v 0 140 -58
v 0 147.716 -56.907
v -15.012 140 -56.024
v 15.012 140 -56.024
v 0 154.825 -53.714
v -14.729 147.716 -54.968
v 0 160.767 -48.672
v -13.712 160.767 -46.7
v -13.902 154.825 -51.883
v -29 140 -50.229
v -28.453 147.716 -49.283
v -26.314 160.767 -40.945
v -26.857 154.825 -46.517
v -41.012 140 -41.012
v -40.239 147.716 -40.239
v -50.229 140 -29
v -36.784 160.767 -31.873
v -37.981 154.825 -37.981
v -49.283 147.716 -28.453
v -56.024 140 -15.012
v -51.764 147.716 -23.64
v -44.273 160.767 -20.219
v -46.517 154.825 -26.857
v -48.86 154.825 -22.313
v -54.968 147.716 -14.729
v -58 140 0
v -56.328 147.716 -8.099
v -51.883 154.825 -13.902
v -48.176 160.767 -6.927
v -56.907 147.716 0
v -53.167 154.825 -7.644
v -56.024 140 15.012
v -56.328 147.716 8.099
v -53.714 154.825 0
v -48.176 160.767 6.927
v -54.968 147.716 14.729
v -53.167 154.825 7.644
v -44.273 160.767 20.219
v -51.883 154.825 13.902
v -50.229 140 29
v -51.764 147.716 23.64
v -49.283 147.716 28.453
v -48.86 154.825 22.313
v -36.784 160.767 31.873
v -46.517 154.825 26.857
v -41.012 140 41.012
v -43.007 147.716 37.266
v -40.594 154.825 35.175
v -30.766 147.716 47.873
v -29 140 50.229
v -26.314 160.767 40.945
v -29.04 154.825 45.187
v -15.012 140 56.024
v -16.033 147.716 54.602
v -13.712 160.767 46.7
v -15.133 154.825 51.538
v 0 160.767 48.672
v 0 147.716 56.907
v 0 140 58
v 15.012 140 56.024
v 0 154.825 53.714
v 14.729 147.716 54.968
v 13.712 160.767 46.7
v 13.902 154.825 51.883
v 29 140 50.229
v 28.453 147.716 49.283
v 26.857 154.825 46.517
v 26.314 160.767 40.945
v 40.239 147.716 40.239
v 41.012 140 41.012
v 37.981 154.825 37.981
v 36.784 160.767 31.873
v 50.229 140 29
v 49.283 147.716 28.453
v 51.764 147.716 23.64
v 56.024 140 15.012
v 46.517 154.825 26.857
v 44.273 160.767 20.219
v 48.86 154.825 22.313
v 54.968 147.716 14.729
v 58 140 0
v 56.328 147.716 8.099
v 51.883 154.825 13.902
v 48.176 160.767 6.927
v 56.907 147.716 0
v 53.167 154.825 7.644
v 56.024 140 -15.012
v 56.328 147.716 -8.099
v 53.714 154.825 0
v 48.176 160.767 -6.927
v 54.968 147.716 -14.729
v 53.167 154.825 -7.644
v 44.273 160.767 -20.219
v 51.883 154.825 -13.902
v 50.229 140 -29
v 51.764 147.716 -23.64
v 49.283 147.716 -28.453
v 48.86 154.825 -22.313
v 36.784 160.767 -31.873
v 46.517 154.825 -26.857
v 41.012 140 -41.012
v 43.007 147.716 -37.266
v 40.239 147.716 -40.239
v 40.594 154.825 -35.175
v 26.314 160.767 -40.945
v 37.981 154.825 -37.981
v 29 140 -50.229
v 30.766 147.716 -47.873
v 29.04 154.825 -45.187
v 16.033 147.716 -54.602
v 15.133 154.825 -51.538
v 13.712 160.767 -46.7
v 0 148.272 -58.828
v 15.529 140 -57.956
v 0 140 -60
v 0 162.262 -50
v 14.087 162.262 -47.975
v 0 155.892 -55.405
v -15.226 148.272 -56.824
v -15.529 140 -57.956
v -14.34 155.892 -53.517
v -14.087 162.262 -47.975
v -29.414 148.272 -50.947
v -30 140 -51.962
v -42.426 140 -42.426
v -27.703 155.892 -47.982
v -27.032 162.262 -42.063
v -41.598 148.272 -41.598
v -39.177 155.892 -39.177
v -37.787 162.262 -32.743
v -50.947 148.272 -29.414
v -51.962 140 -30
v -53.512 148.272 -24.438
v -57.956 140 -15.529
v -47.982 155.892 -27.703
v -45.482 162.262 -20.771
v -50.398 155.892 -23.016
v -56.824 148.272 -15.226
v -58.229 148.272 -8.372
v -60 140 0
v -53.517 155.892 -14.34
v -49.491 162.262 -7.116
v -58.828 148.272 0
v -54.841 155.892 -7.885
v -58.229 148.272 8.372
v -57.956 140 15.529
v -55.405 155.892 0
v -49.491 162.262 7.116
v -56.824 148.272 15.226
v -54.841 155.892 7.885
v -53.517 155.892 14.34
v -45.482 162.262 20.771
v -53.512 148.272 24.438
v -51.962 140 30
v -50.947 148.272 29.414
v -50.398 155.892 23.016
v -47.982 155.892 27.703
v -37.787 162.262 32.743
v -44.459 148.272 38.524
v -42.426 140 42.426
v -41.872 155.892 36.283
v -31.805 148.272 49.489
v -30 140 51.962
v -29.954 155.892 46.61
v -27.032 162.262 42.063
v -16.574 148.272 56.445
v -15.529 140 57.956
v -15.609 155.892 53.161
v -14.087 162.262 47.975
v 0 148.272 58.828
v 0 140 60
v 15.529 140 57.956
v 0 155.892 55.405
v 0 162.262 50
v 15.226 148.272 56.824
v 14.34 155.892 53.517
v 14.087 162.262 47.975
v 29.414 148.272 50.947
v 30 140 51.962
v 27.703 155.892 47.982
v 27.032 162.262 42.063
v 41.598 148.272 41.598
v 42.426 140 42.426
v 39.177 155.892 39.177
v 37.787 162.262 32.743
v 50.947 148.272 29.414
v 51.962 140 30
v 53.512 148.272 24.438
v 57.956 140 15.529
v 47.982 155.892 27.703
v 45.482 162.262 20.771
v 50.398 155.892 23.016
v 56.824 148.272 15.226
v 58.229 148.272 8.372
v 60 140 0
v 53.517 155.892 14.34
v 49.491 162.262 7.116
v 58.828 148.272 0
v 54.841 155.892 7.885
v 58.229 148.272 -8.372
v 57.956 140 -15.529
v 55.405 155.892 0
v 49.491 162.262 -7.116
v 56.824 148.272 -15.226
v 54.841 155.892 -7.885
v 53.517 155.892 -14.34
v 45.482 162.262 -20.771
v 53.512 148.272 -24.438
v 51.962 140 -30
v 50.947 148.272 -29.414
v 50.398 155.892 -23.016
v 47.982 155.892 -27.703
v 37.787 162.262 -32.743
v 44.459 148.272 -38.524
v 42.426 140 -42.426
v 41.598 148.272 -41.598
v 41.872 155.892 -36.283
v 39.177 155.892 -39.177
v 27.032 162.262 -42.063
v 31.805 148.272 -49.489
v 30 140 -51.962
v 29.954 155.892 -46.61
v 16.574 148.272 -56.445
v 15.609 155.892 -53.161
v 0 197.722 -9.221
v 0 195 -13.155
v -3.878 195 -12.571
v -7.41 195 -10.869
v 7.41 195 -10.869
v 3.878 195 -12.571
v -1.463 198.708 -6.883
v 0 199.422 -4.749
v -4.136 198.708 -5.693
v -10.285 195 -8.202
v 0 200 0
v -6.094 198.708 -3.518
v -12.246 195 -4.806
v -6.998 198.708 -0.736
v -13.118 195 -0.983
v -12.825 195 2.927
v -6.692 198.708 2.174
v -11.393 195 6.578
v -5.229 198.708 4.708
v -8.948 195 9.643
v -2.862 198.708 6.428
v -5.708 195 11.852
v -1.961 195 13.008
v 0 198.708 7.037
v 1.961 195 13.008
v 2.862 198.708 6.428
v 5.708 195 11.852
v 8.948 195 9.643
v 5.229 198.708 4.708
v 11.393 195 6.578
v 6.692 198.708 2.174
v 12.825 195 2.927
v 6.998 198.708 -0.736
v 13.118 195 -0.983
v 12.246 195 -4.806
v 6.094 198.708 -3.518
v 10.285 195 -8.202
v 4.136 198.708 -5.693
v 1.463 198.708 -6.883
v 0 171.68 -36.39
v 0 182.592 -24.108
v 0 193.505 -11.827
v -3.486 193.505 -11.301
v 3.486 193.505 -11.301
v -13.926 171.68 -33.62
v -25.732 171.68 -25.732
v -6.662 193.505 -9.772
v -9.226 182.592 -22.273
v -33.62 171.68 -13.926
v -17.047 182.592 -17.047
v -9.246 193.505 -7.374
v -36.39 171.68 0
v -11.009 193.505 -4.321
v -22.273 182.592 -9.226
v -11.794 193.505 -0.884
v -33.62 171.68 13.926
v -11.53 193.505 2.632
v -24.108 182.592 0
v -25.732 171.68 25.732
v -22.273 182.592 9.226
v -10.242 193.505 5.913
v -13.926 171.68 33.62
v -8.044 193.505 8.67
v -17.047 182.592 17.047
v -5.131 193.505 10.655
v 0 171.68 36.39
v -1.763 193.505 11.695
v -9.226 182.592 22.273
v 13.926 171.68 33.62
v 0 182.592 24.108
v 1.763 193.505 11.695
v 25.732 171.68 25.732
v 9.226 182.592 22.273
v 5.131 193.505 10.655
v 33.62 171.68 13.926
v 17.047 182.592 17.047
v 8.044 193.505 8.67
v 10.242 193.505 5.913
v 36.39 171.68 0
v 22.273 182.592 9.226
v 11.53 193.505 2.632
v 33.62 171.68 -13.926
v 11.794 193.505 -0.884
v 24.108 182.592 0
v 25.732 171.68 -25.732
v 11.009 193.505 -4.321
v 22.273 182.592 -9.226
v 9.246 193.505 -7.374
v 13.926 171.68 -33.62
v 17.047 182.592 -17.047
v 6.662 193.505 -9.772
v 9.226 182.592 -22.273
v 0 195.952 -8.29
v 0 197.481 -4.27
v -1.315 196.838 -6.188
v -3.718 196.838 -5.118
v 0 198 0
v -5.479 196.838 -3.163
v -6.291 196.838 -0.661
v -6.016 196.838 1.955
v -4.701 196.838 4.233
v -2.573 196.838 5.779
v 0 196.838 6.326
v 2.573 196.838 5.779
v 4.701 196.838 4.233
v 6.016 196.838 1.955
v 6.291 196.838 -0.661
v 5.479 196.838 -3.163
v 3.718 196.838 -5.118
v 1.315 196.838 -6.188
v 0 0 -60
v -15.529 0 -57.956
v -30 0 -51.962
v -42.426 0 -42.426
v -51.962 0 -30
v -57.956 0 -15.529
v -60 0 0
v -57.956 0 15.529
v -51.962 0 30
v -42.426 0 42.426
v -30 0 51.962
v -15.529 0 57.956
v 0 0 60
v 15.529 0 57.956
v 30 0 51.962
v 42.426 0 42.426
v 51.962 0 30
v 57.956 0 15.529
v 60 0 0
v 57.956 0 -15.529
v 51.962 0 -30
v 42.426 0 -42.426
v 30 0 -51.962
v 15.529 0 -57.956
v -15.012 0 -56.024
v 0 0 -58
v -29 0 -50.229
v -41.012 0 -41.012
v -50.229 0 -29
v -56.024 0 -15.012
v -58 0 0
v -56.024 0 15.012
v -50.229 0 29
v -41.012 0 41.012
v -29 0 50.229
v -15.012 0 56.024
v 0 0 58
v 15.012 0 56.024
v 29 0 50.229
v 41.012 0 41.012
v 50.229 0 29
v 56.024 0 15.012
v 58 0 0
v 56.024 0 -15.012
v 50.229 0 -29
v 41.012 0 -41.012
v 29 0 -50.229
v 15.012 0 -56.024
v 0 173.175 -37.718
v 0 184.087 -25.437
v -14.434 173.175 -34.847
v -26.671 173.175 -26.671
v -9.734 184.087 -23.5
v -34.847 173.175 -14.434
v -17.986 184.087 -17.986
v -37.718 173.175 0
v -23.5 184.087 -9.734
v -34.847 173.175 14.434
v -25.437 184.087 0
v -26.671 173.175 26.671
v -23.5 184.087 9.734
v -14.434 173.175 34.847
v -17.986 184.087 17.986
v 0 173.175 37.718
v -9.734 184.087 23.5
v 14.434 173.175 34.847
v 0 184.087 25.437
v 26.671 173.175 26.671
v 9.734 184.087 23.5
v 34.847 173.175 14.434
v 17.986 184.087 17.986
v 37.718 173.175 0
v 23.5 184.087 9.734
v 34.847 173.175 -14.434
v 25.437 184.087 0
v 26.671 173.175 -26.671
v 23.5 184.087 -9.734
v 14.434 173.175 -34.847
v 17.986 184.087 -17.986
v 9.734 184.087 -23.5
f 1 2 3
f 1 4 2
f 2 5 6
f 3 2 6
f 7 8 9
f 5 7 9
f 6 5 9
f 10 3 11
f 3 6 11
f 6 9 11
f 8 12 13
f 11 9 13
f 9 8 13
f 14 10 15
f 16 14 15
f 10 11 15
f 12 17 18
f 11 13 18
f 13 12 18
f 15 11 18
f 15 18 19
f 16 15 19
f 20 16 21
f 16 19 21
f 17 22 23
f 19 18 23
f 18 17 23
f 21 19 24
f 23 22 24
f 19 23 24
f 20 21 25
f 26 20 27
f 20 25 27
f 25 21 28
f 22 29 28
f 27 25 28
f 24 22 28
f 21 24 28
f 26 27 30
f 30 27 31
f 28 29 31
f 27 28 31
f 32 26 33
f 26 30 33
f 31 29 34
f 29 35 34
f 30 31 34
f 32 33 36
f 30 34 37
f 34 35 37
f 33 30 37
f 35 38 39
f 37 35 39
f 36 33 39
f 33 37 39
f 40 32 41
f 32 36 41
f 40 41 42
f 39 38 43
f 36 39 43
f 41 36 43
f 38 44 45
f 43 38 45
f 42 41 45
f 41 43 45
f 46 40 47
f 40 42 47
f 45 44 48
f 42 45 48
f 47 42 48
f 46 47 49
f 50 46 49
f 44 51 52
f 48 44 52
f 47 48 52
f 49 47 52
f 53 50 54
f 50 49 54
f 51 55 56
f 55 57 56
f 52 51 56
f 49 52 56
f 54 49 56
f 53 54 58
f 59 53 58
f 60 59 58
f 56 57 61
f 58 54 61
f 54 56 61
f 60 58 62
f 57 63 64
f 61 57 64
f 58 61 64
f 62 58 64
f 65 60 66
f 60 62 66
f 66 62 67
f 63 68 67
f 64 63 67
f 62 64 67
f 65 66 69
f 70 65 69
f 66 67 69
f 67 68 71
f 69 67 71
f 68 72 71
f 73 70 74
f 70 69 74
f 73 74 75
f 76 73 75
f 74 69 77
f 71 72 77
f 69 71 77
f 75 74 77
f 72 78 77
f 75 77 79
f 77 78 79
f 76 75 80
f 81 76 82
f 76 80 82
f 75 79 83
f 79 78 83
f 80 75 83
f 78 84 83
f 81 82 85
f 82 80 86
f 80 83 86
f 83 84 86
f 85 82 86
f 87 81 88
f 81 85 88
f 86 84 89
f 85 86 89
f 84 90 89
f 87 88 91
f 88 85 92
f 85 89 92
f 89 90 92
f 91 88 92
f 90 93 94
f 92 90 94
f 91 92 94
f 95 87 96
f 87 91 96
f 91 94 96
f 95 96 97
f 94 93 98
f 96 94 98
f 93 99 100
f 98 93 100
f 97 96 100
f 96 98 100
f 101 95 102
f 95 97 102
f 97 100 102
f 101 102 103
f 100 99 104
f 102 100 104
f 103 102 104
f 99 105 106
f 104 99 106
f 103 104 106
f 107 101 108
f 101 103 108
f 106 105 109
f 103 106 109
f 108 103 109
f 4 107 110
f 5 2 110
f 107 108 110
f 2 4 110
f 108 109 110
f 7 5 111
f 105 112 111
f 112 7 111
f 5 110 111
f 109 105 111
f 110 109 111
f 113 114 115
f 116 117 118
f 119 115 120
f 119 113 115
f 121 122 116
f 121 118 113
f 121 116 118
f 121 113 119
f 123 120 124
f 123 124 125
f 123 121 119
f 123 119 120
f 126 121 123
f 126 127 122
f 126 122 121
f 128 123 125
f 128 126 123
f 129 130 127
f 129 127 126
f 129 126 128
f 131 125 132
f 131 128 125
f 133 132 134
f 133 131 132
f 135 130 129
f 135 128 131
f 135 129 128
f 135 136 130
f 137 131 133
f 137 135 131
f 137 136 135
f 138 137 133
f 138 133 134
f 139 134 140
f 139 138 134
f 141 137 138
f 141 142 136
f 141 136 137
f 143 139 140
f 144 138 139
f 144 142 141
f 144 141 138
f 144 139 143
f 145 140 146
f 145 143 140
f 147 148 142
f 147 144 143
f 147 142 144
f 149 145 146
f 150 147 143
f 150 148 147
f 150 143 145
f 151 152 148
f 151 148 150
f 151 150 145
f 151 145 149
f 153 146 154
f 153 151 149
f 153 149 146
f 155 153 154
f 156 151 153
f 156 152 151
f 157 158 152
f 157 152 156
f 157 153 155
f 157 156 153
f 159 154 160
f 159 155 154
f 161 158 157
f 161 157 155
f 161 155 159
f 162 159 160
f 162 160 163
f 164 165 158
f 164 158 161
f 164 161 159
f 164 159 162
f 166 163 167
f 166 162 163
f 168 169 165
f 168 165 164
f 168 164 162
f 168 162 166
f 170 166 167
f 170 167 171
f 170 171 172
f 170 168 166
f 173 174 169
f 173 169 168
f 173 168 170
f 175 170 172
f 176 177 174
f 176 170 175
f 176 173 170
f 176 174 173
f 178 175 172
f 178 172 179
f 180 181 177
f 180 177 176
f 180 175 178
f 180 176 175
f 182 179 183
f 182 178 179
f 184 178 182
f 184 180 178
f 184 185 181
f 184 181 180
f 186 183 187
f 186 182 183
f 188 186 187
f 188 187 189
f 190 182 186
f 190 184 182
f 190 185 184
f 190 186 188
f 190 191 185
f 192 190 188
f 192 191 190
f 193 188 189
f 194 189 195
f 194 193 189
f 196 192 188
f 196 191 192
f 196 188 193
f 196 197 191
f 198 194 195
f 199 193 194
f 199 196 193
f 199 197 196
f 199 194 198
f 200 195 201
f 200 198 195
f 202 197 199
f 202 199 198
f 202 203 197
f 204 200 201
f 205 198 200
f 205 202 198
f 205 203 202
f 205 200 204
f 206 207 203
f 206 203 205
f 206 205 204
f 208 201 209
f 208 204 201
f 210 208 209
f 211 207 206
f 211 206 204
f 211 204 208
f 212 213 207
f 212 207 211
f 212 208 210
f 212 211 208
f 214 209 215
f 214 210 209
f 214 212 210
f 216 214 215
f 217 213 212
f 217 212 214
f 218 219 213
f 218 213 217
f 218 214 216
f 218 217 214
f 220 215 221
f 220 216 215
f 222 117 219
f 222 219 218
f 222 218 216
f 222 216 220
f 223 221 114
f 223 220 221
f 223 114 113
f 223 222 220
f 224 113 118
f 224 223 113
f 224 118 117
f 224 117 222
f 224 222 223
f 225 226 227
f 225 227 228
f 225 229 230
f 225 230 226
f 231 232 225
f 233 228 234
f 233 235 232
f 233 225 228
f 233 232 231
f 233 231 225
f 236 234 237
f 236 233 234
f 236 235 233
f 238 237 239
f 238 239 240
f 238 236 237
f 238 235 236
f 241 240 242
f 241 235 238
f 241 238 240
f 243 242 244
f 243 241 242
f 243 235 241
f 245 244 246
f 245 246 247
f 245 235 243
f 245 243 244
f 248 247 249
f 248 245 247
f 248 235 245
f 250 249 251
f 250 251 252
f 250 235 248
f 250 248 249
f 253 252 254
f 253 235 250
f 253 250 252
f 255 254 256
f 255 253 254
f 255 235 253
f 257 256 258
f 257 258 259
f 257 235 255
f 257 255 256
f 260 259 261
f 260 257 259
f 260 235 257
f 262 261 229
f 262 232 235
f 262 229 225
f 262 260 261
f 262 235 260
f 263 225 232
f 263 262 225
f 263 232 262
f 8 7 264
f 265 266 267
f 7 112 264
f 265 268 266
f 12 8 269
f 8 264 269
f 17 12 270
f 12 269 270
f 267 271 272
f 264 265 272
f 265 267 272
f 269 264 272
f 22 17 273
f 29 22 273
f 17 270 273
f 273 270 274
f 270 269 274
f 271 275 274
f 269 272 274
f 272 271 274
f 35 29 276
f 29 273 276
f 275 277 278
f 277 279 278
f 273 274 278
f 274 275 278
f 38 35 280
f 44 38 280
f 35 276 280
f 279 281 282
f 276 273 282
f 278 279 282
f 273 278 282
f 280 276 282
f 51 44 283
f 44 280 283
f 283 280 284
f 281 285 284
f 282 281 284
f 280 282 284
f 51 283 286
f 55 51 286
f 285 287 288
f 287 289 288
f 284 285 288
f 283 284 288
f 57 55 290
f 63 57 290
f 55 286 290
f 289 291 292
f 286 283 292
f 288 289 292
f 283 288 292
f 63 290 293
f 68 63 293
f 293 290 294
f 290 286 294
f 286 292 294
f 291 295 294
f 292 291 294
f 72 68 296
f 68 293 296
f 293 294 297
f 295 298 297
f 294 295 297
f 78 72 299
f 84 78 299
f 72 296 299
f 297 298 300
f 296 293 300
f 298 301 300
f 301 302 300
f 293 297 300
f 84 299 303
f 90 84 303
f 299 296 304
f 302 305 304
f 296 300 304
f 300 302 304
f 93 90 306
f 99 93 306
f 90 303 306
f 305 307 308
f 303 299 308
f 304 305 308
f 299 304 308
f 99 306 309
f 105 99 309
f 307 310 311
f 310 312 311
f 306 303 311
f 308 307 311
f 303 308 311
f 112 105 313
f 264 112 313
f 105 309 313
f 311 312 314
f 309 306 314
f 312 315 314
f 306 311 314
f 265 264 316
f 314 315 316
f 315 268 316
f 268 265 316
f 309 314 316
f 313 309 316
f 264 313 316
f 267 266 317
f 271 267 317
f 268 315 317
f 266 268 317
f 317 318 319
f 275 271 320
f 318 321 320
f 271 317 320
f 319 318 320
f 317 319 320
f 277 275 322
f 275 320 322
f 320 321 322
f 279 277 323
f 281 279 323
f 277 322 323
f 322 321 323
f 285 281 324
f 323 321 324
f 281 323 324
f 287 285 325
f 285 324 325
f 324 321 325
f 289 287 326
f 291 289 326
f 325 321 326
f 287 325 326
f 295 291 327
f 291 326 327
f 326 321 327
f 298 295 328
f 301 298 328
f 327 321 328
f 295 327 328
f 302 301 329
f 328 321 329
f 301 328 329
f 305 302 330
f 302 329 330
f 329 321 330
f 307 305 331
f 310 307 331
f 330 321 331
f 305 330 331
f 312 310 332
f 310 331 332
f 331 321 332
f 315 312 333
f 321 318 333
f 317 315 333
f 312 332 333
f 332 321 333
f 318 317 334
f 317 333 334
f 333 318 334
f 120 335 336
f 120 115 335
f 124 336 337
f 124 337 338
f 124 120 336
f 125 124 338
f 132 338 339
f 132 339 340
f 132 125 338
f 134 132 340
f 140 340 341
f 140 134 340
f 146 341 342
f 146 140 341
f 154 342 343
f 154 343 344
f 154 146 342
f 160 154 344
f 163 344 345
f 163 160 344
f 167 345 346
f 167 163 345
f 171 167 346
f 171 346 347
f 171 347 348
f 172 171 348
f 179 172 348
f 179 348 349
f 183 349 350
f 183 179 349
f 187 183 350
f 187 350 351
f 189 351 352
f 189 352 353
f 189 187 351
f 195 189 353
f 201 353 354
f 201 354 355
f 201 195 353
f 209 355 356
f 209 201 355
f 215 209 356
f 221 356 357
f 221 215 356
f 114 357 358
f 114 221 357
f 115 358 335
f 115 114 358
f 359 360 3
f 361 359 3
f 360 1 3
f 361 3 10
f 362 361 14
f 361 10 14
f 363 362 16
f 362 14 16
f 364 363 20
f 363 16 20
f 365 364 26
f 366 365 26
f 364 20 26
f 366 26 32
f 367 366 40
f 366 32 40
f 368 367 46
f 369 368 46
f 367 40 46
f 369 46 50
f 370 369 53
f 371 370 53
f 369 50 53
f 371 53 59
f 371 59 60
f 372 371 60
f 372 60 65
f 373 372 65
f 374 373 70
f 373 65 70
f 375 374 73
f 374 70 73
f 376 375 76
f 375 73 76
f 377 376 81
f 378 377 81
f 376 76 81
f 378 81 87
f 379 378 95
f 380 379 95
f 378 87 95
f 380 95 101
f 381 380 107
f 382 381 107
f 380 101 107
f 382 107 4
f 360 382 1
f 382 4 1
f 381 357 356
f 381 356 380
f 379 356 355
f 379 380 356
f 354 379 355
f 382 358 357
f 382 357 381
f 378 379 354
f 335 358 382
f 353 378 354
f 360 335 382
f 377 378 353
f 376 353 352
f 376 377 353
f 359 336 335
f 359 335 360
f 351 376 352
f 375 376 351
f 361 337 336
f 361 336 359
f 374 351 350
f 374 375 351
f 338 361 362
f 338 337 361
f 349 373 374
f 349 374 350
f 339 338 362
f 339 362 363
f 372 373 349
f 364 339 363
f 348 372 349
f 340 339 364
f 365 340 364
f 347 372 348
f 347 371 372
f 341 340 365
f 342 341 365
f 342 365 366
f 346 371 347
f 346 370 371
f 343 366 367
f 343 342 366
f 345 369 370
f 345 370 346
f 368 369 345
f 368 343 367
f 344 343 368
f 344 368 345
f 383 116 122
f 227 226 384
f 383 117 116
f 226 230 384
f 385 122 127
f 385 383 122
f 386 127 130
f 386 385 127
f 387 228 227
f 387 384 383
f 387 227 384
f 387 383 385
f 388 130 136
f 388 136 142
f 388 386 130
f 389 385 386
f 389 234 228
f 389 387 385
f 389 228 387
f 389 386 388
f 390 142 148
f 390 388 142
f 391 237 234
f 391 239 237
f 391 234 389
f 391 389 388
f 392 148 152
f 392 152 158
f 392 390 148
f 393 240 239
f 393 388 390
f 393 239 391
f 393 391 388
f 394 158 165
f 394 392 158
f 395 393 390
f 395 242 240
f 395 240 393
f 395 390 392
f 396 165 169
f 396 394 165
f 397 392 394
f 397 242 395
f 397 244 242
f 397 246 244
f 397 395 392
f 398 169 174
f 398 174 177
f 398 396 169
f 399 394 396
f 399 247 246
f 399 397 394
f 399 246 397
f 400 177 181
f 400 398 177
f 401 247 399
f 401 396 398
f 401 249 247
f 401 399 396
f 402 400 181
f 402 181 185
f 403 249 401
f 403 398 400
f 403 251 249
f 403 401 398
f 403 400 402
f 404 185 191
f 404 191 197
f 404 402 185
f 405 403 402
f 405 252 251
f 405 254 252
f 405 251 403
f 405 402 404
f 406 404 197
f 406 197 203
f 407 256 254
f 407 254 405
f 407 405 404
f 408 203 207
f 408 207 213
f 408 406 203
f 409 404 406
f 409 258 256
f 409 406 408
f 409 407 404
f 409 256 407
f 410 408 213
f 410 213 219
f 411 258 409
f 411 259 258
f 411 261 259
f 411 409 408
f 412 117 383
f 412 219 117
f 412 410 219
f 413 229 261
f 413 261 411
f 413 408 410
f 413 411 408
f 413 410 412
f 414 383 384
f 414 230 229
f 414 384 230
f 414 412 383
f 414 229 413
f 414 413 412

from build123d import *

# Parameters (mm, degrees)
SHELL2_T = -2


with BuildPart() as part:
    # Sketch1 → Revolve2 (revolve)
    with BuildSketch(Plane.XY, mode=Mode.PRIVATE) as revolve2_sk:
        with BuildLine():
            Line((50, 162.262364882), (13.155033794, 195))
            ThreePointArc((13.155033794, 195), (7.036599216, 198.707848685), (0, 200))
            Line((0, 200), (0, 140))
            Line((0, 140), (0, 0))
            Line((0, 0), (60, 0))
            Line((60, 0), (60, 140))
            ThreePointArc((60, 140), (57.38520841, 152.202590812), (50, 162.262364882))
        make_face()
    revolve(revolve2_sk.sketch.rotate(Axis((0, 0, 0), (0, 1, 0)), 90), axis=Axis((0, 0, 0), (0, 1, 0)))

    # Shell2
    shell2_openings = [part.faces().sort_by_distance(p)[0] for p in [
        (0, 0, 0),
    ]]
    offset(amount=SHELL2_T, openings=shell2_openings, kind=Kind.INTERSECTION)


solid = part.part
